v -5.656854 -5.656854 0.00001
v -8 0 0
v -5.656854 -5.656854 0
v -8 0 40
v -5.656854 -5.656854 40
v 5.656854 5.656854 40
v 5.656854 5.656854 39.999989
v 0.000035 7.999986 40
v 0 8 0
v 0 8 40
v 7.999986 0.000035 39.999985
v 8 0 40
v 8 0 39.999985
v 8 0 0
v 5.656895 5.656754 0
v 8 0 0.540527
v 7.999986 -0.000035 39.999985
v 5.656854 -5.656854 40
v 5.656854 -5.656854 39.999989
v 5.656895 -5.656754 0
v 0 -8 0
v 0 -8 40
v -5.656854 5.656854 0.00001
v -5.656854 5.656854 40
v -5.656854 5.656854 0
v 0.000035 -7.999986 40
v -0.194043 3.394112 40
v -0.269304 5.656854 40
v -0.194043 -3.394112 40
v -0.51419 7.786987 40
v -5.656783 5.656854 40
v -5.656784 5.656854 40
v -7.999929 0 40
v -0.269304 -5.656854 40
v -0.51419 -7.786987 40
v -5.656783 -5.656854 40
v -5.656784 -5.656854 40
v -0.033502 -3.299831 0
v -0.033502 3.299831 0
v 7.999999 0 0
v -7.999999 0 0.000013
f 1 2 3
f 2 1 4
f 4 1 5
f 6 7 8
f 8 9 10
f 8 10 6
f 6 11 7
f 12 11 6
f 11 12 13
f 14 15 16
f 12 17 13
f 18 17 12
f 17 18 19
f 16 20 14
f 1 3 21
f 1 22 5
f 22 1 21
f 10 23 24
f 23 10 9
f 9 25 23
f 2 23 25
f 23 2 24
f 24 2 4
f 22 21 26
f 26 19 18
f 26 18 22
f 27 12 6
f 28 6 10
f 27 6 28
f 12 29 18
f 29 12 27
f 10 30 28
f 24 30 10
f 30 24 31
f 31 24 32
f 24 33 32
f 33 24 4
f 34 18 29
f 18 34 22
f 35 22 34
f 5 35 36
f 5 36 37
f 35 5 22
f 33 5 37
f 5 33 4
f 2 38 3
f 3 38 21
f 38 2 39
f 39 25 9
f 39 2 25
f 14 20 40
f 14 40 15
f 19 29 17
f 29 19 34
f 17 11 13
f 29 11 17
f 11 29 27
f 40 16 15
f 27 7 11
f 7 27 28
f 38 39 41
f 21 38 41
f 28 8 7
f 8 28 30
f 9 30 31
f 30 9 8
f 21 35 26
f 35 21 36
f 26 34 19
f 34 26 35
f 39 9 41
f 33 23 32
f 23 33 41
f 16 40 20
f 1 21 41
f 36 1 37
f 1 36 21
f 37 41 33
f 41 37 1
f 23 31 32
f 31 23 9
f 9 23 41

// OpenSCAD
color([0.4,0.7,1]) difference() {
 cylinder(h=40,r=8,$fn=8);
 rotate([0,0.0001,0]) cylinder(h=40,r=8,$fn=8);
}
